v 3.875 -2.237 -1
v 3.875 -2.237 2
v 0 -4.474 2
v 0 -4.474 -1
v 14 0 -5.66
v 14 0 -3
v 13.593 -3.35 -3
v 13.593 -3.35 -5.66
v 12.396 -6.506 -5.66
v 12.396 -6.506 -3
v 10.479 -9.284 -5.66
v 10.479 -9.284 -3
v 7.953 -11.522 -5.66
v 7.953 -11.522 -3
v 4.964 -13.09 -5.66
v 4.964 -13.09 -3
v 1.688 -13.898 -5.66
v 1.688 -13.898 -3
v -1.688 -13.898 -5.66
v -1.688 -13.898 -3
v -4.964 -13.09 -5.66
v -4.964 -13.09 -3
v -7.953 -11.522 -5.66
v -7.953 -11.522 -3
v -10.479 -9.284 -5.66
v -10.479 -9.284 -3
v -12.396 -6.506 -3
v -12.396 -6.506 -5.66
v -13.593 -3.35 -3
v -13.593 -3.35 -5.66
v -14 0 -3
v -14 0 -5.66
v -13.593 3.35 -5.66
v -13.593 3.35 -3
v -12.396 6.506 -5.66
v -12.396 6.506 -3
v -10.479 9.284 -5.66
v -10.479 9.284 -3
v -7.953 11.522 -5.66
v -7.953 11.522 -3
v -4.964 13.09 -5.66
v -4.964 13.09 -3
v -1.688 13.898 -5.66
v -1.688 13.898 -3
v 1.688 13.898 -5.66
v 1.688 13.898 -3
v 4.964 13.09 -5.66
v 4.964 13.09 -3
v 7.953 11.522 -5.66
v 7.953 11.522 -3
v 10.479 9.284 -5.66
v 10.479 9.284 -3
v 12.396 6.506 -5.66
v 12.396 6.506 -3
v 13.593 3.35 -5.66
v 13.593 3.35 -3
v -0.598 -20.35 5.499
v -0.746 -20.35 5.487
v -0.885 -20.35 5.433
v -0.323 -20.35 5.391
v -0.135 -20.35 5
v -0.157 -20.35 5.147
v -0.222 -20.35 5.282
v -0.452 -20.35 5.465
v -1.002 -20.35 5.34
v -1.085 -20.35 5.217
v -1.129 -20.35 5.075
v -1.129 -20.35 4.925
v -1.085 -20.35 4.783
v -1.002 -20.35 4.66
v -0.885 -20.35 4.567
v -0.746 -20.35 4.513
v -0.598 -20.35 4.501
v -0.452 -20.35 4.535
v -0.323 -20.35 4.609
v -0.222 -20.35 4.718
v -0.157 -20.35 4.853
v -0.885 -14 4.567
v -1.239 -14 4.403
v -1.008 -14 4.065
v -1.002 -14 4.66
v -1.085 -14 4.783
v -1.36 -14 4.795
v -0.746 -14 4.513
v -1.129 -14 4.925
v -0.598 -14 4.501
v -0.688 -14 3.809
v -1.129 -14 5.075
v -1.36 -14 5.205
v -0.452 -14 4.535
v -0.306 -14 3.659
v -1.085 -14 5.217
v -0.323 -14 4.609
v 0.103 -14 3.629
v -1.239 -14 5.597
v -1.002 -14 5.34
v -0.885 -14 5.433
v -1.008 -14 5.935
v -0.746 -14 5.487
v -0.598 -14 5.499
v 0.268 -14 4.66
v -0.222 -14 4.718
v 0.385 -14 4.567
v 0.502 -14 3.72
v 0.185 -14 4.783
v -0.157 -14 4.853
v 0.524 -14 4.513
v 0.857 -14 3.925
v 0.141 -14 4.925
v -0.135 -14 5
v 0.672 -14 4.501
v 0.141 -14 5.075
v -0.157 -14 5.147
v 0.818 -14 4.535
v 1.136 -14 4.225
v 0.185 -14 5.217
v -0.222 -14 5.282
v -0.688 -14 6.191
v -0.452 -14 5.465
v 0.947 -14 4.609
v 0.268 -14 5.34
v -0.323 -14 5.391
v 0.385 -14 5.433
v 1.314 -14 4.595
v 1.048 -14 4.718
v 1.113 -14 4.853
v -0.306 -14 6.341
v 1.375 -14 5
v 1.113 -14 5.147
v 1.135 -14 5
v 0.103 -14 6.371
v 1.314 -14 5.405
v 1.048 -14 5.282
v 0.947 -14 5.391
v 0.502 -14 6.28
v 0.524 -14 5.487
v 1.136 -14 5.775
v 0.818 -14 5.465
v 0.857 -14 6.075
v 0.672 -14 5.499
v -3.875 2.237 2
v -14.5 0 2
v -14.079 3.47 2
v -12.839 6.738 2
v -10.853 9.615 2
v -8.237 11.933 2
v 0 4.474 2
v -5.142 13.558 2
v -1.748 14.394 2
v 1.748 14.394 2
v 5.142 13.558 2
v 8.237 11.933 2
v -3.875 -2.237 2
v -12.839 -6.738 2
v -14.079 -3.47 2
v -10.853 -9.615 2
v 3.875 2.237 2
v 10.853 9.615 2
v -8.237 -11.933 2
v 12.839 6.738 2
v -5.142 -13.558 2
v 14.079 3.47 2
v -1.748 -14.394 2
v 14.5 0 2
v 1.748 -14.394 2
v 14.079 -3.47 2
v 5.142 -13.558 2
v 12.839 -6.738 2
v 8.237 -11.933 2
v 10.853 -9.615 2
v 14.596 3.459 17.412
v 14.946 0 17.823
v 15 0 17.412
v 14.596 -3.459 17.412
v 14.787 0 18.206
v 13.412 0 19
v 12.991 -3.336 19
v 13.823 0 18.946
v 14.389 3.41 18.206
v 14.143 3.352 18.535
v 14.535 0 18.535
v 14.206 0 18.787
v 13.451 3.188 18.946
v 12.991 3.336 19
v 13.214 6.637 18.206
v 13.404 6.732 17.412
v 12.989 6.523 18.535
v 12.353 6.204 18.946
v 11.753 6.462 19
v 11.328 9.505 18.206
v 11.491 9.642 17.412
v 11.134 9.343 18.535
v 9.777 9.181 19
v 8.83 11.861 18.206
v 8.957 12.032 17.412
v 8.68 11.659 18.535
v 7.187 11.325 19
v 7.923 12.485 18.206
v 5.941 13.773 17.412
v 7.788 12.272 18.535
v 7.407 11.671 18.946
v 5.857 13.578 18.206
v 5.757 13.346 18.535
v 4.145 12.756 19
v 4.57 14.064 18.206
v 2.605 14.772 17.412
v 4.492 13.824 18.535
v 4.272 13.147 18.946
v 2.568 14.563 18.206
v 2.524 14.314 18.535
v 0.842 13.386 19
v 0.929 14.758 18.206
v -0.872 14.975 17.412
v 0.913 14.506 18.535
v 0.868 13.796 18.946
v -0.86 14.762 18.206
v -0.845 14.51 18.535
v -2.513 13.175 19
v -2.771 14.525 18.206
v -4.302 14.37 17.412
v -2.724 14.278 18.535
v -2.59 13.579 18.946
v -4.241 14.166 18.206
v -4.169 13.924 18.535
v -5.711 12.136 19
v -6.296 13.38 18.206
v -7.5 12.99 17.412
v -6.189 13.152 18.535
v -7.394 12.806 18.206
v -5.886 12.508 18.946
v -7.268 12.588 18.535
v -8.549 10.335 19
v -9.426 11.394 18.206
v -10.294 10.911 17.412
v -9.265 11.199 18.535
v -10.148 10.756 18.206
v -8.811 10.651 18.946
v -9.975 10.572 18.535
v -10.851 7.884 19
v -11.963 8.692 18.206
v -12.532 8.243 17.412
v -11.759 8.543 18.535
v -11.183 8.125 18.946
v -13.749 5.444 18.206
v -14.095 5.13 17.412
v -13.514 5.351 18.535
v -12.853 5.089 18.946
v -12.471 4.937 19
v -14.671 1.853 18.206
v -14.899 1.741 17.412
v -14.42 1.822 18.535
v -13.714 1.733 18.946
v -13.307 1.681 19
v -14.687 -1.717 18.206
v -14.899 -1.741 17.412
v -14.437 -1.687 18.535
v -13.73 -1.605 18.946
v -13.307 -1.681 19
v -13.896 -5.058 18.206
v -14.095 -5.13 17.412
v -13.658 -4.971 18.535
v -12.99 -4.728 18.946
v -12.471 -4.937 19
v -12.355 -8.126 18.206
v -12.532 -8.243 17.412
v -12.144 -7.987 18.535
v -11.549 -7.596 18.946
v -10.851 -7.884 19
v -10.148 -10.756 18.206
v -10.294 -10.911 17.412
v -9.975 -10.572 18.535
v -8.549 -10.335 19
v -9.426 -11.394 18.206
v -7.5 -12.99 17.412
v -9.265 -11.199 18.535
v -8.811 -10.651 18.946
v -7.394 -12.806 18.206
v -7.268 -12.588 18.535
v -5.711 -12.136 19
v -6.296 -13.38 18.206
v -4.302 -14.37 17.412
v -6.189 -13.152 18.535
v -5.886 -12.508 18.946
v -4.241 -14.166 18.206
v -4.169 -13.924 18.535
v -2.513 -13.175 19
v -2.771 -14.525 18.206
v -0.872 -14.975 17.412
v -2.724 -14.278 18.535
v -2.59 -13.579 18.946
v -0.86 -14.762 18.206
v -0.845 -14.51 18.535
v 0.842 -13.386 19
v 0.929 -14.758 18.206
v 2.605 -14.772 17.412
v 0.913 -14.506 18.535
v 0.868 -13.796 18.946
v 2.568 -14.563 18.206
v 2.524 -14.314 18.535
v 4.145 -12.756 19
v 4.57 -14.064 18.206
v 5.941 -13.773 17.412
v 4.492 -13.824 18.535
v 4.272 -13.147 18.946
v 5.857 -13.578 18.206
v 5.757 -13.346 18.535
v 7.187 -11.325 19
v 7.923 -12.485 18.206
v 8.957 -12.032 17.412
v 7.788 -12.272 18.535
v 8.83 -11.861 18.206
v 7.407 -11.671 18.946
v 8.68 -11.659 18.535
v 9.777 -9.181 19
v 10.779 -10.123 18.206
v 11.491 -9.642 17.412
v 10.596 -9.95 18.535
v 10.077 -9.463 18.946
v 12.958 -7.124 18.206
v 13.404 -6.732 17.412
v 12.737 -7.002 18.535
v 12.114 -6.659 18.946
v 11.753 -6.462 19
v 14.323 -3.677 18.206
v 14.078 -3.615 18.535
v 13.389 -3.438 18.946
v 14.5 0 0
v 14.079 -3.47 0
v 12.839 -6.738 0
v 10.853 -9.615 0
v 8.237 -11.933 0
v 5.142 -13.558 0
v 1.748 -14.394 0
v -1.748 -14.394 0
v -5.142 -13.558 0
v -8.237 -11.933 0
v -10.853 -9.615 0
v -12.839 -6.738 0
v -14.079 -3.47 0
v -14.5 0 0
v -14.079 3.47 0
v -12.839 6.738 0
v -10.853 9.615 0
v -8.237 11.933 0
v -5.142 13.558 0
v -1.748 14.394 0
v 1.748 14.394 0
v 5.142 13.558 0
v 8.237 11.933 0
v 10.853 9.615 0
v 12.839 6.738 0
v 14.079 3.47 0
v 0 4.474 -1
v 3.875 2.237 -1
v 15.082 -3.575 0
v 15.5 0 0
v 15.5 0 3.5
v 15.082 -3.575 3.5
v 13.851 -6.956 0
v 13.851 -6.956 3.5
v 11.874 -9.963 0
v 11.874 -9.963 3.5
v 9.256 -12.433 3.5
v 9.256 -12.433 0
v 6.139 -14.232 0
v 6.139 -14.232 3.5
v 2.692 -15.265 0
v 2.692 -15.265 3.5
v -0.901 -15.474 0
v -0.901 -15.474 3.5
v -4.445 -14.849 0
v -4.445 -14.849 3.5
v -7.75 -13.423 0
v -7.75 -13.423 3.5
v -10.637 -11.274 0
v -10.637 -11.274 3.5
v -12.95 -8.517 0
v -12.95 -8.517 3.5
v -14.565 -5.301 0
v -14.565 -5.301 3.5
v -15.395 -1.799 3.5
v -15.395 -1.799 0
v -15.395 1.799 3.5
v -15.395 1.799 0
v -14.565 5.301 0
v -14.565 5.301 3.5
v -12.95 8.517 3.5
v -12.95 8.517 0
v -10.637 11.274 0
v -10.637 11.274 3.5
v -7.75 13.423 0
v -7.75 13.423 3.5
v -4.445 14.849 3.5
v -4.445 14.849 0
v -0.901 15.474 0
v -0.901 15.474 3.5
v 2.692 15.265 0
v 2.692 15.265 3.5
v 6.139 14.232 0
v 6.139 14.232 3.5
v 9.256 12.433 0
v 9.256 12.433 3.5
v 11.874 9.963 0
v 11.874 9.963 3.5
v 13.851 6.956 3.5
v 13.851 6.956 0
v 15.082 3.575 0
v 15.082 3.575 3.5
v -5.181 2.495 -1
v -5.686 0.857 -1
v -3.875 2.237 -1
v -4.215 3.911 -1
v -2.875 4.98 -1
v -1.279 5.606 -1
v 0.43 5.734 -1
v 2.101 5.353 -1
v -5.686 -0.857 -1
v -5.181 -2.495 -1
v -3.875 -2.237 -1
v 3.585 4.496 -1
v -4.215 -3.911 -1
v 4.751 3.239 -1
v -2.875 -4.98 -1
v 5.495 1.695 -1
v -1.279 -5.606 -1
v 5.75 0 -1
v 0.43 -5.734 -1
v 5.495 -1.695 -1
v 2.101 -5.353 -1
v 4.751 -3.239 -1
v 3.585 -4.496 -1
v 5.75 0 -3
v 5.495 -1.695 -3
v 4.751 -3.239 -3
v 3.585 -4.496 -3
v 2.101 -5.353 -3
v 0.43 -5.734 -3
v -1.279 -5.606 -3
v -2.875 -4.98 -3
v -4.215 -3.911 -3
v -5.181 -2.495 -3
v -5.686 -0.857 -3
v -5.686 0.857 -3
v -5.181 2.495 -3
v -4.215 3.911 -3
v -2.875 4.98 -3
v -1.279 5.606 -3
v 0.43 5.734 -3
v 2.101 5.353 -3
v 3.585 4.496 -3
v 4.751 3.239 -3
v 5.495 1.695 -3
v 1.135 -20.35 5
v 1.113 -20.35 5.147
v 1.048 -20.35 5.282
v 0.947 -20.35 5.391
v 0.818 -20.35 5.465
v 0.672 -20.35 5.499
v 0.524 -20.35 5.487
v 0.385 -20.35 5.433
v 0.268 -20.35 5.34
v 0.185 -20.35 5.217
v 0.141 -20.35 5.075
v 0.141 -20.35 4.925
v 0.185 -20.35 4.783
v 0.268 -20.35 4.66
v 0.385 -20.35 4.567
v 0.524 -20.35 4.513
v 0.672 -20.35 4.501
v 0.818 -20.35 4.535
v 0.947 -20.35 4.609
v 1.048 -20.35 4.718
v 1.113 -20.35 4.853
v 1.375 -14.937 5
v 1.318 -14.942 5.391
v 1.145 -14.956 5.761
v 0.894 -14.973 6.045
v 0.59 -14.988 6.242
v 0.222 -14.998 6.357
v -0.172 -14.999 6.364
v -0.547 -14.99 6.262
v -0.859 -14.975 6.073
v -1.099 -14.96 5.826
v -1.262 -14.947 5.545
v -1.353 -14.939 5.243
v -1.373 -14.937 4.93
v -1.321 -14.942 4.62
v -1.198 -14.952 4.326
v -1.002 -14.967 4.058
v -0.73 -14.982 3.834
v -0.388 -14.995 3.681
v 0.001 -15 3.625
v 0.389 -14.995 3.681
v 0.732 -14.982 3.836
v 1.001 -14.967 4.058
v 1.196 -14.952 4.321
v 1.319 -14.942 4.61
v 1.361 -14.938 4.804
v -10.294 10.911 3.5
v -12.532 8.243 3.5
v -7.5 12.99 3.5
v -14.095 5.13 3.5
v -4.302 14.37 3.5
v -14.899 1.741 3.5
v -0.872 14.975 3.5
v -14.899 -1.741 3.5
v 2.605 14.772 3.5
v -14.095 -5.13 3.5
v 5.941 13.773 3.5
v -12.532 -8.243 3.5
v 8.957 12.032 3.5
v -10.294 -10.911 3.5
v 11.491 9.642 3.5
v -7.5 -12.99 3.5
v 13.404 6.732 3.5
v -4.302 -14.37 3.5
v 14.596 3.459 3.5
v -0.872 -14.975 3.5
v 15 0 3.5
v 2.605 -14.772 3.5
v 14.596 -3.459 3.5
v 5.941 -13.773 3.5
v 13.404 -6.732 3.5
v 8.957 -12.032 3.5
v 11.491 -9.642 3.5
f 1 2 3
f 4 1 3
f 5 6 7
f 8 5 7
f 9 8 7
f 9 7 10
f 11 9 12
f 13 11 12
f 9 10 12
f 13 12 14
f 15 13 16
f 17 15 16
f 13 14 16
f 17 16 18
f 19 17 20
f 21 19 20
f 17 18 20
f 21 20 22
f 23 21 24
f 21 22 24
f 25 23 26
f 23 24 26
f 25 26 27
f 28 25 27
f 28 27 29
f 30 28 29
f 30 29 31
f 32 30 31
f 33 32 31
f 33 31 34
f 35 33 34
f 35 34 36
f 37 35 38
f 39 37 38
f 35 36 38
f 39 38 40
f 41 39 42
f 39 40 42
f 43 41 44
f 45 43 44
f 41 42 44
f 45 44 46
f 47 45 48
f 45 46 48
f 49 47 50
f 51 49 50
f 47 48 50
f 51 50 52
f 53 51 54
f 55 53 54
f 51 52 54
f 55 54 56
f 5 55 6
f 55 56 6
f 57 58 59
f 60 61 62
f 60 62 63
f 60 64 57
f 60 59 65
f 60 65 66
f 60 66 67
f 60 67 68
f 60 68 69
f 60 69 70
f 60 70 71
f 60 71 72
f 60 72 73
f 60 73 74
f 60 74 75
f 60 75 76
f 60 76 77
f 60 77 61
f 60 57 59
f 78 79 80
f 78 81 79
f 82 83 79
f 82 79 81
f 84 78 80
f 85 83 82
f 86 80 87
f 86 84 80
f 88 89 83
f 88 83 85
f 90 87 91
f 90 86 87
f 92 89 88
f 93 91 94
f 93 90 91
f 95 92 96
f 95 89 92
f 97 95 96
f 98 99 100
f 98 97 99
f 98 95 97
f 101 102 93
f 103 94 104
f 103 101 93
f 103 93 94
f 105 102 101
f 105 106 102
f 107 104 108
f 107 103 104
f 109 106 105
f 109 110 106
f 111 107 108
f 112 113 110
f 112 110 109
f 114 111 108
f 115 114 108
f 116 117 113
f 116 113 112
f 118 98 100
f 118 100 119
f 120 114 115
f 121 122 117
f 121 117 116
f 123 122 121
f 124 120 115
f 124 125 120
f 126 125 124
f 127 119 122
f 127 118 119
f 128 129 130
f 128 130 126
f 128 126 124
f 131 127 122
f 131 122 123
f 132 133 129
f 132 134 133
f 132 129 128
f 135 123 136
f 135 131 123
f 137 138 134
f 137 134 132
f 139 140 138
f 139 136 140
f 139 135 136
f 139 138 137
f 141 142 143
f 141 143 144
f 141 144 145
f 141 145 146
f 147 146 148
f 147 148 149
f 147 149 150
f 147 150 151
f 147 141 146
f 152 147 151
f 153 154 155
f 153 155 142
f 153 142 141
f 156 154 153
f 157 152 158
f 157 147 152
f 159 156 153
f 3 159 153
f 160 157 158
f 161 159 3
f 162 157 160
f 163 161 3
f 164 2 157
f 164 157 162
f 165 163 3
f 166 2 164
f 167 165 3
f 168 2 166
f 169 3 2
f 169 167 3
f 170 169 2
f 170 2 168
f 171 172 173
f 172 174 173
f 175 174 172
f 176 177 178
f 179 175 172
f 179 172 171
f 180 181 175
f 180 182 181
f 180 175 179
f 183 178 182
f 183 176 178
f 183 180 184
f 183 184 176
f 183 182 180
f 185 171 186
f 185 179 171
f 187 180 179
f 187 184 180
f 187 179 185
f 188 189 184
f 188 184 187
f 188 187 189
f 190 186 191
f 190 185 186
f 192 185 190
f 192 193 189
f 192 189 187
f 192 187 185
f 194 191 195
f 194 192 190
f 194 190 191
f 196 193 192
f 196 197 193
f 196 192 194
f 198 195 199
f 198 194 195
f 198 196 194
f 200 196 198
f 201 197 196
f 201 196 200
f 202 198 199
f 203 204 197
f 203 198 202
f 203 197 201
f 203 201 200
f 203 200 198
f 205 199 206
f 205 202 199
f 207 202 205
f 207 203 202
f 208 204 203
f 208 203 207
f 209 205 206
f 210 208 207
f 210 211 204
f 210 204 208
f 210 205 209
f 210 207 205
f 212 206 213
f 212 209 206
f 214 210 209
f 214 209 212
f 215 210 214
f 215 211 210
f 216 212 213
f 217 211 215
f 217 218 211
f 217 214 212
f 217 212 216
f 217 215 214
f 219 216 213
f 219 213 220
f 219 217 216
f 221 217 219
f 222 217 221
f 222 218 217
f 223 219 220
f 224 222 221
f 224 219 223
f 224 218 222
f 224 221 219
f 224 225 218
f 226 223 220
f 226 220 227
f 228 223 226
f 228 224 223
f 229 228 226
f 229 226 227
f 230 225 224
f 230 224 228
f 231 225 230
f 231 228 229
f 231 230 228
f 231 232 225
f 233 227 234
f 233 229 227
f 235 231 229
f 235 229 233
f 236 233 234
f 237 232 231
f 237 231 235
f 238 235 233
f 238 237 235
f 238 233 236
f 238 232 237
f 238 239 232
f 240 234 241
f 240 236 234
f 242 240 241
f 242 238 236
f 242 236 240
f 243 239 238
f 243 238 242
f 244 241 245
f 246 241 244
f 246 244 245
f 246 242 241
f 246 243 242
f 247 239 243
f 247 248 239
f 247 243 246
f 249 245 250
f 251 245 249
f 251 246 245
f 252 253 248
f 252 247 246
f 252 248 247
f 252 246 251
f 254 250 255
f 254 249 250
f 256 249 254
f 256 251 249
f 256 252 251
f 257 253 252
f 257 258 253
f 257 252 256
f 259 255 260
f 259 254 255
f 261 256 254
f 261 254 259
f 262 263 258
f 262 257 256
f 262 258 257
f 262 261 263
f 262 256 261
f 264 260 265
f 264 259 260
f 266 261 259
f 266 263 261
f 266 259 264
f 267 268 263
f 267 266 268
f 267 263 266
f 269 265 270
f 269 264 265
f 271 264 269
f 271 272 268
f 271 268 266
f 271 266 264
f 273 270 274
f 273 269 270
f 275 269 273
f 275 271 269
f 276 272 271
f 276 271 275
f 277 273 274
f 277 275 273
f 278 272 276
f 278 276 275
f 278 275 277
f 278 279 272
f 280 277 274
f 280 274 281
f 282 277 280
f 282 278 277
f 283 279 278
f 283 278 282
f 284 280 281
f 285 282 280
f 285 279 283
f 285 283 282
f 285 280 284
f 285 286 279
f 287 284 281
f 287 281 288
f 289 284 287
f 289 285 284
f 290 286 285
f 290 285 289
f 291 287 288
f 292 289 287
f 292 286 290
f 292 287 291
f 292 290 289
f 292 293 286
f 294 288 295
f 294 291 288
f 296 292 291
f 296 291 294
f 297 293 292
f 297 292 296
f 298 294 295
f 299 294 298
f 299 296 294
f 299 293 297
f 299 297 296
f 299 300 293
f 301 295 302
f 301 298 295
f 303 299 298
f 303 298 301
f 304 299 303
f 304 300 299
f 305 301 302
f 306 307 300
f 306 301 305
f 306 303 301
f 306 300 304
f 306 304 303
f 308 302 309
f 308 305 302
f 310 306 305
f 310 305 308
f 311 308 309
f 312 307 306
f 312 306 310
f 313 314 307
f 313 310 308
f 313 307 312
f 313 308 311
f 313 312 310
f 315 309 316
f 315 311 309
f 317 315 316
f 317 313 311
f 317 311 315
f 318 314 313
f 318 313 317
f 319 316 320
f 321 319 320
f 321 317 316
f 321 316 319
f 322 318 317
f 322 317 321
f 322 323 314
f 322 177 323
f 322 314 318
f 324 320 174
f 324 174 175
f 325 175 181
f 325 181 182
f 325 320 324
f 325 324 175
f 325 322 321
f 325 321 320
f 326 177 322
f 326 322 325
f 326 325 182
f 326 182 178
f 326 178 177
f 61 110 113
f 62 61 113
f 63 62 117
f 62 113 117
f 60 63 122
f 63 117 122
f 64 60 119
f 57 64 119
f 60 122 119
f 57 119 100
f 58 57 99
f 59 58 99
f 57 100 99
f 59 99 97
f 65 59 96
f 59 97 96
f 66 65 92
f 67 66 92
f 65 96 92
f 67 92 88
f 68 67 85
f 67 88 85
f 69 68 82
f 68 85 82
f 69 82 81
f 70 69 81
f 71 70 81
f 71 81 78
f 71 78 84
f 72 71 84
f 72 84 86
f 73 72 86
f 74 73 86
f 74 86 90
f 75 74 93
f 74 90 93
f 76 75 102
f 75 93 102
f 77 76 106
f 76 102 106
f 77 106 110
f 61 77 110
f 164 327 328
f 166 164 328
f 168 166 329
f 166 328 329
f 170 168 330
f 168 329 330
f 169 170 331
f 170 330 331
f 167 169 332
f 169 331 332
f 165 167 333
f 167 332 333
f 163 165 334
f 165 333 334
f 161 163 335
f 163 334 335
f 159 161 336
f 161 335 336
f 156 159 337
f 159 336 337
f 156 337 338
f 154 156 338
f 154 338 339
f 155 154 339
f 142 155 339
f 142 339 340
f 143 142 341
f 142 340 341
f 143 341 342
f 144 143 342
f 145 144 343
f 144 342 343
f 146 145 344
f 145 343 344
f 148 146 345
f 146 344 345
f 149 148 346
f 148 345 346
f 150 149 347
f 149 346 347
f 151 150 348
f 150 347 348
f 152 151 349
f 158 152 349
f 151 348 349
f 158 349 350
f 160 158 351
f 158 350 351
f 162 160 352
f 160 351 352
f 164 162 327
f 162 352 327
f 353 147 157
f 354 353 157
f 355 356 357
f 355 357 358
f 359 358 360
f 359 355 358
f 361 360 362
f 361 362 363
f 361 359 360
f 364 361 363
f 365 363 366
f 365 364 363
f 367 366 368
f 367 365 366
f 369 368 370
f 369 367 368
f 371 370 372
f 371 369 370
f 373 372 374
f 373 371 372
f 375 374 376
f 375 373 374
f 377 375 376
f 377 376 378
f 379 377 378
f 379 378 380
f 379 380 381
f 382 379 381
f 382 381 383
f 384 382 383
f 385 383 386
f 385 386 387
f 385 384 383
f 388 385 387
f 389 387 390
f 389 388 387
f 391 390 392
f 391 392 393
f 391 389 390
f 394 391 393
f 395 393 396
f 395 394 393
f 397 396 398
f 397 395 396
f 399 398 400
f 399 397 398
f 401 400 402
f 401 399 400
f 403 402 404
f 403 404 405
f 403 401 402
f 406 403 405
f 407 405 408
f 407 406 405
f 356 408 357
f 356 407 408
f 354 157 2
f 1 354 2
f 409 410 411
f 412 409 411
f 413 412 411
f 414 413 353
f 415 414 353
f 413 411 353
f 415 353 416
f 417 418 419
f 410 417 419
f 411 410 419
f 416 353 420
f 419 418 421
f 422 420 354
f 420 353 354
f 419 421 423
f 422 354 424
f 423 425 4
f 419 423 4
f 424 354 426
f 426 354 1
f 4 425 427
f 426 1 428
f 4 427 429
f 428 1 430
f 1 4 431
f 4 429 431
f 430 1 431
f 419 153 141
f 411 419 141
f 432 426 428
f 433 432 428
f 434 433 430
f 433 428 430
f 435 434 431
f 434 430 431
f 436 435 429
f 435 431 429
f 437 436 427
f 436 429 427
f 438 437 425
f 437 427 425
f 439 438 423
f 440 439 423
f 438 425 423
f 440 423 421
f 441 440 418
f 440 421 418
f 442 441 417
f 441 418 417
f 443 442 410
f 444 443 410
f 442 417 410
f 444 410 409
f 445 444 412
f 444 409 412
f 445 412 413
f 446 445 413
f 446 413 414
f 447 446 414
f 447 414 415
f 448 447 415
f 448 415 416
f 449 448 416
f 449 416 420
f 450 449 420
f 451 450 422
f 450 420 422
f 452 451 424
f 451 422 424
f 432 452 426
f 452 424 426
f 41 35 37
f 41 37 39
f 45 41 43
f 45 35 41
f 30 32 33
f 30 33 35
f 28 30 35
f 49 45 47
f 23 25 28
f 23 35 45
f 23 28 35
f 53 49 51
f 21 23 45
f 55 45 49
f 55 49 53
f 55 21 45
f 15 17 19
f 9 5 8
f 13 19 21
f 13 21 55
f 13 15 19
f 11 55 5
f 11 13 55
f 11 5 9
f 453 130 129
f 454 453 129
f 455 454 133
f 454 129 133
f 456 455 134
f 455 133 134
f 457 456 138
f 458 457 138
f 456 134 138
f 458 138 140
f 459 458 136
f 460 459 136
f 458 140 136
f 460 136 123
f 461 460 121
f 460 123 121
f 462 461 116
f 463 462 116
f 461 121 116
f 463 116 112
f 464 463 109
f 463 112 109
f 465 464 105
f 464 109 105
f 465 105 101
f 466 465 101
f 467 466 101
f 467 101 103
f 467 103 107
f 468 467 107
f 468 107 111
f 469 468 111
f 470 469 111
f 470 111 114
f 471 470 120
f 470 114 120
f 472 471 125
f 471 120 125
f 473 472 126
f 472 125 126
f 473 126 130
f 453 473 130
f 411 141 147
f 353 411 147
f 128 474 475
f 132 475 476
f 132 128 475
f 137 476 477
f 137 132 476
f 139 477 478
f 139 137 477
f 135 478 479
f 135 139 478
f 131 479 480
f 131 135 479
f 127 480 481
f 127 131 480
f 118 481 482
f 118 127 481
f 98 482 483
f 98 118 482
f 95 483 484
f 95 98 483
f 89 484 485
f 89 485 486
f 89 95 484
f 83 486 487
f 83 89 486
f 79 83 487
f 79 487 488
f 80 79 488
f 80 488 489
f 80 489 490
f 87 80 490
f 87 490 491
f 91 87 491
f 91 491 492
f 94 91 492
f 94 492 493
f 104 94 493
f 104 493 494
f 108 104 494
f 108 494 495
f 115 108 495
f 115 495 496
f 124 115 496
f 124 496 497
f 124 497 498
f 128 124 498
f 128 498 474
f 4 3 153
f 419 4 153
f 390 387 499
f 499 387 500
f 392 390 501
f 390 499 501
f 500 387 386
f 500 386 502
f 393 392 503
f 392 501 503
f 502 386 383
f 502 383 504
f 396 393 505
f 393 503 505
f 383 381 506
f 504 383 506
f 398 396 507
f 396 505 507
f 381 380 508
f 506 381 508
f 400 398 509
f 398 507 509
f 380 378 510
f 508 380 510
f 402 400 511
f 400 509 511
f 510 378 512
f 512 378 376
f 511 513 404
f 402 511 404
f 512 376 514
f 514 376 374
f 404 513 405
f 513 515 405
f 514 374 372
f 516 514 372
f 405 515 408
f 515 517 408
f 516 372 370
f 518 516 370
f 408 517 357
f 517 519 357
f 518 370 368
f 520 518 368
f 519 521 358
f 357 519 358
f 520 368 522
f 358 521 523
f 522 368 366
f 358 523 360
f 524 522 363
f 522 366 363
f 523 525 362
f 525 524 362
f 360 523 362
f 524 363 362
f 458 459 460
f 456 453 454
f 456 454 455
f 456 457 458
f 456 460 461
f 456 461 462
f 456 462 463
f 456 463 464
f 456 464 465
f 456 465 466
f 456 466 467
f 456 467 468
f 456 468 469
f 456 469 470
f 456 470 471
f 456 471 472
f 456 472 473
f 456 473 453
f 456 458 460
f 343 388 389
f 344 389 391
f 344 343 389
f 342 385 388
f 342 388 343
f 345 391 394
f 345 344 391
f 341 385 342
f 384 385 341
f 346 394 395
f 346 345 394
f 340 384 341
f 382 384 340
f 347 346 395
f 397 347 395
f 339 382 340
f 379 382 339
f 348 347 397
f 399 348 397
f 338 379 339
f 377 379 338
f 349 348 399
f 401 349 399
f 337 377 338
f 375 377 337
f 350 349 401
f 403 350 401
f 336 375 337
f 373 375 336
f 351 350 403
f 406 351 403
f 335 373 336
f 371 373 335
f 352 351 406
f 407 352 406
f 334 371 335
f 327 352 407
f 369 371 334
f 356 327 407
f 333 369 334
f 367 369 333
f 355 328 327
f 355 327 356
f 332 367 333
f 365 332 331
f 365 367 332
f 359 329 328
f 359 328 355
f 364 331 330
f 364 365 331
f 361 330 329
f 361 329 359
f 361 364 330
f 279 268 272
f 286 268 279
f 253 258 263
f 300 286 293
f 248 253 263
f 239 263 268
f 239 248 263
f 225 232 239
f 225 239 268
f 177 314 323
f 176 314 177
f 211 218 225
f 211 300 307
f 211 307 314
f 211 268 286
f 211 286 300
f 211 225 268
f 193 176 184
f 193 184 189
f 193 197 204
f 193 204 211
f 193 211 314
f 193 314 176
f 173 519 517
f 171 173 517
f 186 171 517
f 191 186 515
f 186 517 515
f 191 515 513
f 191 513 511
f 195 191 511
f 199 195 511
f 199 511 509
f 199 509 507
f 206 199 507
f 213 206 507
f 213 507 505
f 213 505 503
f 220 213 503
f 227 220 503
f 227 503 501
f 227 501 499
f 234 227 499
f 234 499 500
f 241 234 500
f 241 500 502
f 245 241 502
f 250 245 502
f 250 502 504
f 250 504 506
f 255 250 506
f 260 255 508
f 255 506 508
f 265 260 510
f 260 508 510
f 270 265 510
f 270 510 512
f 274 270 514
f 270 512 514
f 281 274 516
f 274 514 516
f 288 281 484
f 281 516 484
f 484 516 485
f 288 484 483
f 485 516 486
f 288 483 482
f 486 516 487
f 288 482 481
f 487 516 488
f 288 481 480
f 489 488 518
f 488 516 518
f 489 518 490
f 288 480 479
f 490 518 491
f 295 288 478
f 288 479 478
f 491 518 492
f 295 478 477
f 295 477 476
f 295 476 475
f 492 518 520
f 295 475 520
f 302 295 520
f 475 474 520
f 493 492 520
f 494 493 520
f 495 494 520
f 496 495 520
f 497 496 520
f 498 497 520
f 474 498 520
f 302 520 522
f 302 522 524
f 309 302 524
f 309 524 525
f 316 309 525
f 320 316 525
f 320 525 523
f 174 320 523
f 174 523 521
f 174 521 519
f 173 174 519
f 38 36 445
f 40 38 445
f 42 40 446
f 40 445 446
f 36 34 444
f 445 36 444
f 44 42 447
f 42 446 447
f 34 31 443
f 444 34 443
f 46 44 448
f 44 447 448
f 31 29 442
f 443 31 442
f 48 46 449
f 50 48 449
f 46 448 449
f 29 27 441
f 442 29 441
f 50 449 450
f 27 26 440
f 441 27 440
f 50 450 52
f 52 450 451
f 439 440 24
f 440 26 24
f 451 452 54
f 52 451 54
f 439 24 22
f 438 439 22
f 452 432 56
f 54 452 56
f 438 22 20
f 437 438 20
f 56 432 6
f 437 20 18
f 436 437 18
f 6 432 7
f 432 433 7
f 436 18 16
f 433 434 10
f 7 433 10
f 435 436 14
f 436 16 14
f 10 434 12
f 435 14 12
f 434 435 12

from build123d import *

# Parameters (mm, degrees)
F0_R      = 15
F1_DEPTH  = 19
F2_R      = 1.5875
F3_R      = 15.5
F3_R_2    = 15
F4_DEPTH  = 3.5
F5_R      = 14.5
F6_DEPTH  = 2
F8_DEPTH  = 3
F9_R      = 5.75
F10_DEPTH = 2
F11_R     = 14
F11_R_2   = 5.75
F12_DEPTH = 2.66
F14_START = 14
F13_R     = 1.375
F14_DEPTH = 11.4
F15_R     = 0.5
F16_DEPTH = 6.35


with BuildPart() as f1:
    # F0 (on Top) → F1 (new body)
    with BuildSketch(Plane.XY):
        Circle(F0_R)
    extrude(amount=F1_DEPTH)

    # F2
    f2_edges = [f1.edges().sort_by_distance(p)[0] for p in [
        (-15, 0, 19),
    ]]
    fillet(f2_edges, radius=F2_R)

    # F3 (on face) → F4 (join)
    with BuildSketch(Plane(origin=(0, 0, 0), x_dir=(1, 0, 0), z_dir=(0, 0, -1))):
        Circle(F3_R)
        Circle(F3_R_2, mode=Mode.SUBTRACT)
    extrude(amount=-F4_DEPTH)

    # F5 (on face) → F6 (cut)
    with BuildSketch(Plane(origin=(0, 0, 0), x_dir=(1, 0, 0), z_dir=(0, 0, -1))):
        Circle(F5_R)
    extrude(amount=-F6_DEPTH, mode=Mode.SUBTRACT)

    # F7 (on face) → F8 (join)
    with BuildSketch(Plane(origin=(0, 0, 2), x_dir=(1, 0, 0), z_dir=(0, 0, -1))):
        Polygon((0, 4.4744645862), (-3.875, 2.2372322931), (-3.875, -2.2372322931), (0, -4.4744645862), (3.875, -2.2372322931), (3.875, 2.2372322931), align=None)
    extrude(amount=F8_DEPTH)

    # F9 (on face) → F10 (join)
    with BuildSketch(Plane(origin=(0, 0, -1), x_dir=(1, 0, 0), z_dir=(0, 0, -1))):
        Circle(F9_R)
        Polygon((-3.875, 2.2372322931), (0, 4.4744645862), (3.875, 2.2372322931), (3.875, -2.2372322931), (0, -4.4744645862), (-3.875, -2.2372322931), align=None, mode=Mode.SUBTRACT)
        Polygon((3.875, 2.2372322931), (0, 4.4744645862), (-3.875, 2.2372322931), (-3.875, -2.2372322931), (0, -4.4744645862), (3.875, -2.2372322931), align=None)
    extrude(amount=F10_DEPTH)

    # F11 (on face) → F12 (join)
    with BuildSketch(Plane(origin=(0, 0, -3), x_dir=(1, 0, 0), z_dir=(0, 0, -1))):
        Circle(F11_R)
        Circle(F11_R_2, mode=Mode.SUBTRACT)
        Circle(F11_R_2)
    extrude(amount=F12_DEPTH)

    # F13 (on Front) → F14 (cut)
    with BuildSketch(Plane.XZ.offset(F14_START)):
        with Locations((0, 5)):
            Circle(F13_R)
    extrude(amount=F14_DEPTH, mode=Mode.SUBTRACT)

    # F15 (on face) → F16 (join)
    with BuildSketch(Plane.XZ.offset(14)):
        with Locations((-0.635, 5)):
            Circle(F15_R)
        with Locations((0.635, 5)):
            Circle(F15_R)
    extrude(amount=F16_DEPTH)


solid = f1.part
